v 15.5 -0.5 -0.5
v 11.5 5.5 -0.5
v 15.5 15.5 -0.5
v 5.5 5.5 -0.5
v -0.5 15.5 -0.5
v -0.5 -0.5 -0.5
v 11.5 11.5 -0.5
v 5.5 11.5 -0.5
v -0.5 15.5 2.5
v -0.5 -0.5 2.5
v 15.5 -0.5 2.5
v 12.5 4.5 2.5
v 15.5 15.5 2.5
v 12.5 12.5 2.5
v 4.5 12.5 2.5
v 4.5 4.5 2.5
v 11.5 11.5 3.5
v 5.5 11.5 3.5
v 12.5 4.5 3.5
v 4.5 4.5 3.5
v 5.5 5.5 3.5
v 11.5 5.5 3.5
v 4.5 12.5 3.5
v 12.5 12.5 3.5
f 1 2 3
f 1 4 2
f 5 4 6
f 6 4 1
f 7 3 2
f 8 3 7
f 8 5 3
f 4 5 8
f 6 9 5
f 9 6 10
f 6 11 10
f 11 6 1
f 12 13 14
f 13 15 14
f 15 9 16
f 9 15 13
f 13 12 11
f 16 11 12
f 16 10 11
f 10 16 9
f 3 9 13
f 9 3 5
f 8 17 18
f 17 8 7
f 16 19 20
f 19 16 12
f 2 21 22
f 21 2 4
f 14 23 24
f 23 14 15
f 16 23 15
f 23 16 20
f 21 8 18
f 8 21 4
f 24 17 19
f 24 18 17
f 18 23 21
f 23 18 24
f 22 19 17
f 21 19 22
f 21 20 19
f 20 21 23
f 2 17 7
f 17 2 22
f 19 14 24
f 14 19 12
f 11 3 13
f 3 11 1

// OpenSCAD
union() {
    translate([0, 0, 0]) color("brown") cube([1, 1, 1],center=true);
    translate([0, 0, 1]) color("brown") cube([1, 1, 1],center=true);
    translate([0, 0, 2]) color("brown") cube([1, 1, 1],center=true);
    translate([0, 1, 0]) color("brown") cube([1, 1, 1],center=true);
    translate([0, 1, 1]) color("brown") cube([1, 1, 1],center=true);
    translate([0, 1, 2]) color("brown") cube([1, 1, 1],center=true);
    translate([0, 2, 0]) color("brown") cube([1, 1, 1],center=true);
    translate([0, 2, 1]) color("brown") cube([1, 1, 1],center=true);
    translate([0, 2, 2]) color("brown") cube([1, 1, 1],center=true);
    translate([0, 3, 0]) color("brown") cube([1, 1, 1],center=true);
    translate([0, 3, 1]) color("brown") cube([1, 1, 1],center=true);
    translate([0, 3, 2]) color("brown") cube([1, 1, 1],center=true);
    translate([0, 4, 0]) color("brown") cube([1, 1, 1],center=true);
    translate([0, 4, 1]) color("brown") cube([1, 1, 1],center=true);
    translate([0, 4, 2]) color("brown") cube([1, 1, 1],center=true);
    translate([0, 5, 0]) color("brown") cube([1, 1, 1],center=true);
    translate([0, 5, 1]) color("brown") cube([1, 1, 1],center=true);
    translate([0, 5, 2]) color("brown") cube([1, 1, 1],center=true);
    translate([0, 6, 0]) color("brown") cube([1, 1, 1],center=true);
    translate([0, 6, 1]) color("brown") cube([1, 1, 1],center=true);
    translate([0, 6, 2]) color("brown") cube([1, 1, 1],center=true);
    translate([0, 7, 0]) color("brown") cube([1, 1, 1],center=true);
    translate([0, 7, 1]) color("brown") cube([1, 1, 1],center=true);
    translate([0, 7, 2]) color("brown") cube([1, 1, 1],center=true);
    translate([0, 8, 0]) color("brown") cube([1, 1, 1],center=true);
    translate([0, 8, 1]) color("brown") cube([1, 1, 1],center=true);
    translate([0, 8, 2]) color("brown") cube([1, 1, 1],center=true);
    translate([0, 9, 0]) color("brown") cube([1, 1, 1],center=true);
    translate([0, 9, 1]) color("brown") cube([1, 1, 1],center=true);
    translate([0, 9, 2]) color("brown") cube([1, 1, 1],center=true);
    translate([0, 10, 0]) color("brown") cube([1, 1, 1],center=true);
    translate([0, 10, 1]) color("brown") cube([1, 1, 1],center=true);
    translate([0, 10, 2]) color("brown") cube([1, 1, 1],center=true);
    translate([0, 11, 0]) color("brown") cube([1, 1, 1],center=true);
    translate([0, 11, 1]) color("brown") cube([1, 1, 1],center=true);
    translate([0, 11, 2]) color("brown") cube([1, 1, 1],center=true);
    translate([0, 12, 0]) color("brown") cube([1, 1, 1],center=true);
    translate([0, 12, 1]) color("brown") cube([1, 1, 1],center=true);
    translate([0, 12, 2]) color("brown") cube([1, 1, 1],center=true);
    translate([0, 13, 0]) color("brown") cube([1, 1, 1],center=true);
    translate([0, 13, 1]) color("brown") cube([1, 1, 1],center=true);
    translate([0, 13, 2]) color("brown") cube([1, 1, 1],center=true);
    translate([0, 14, 0]) color("brown") cube([1, 1, 1],center=true);
    translate([0, 14, 1]) color("brown") cube([1, 1, 1],center=true);
    translate([0, 14, 2]) color("brown") cube([1, 1, 1],center=true);
    translate([0, 15, 0]) color("brown") cube([1, 1, 1],center=true);
    translate([0, 15, 1]) color("brown") cube([1, 1, 1],center=true);
    translate([0, 15, 2]) color("brown") cube([1, 1, 1],center=true);
    translate([1, 0, 0]) color("brown") cube([1, 1, 1],center=true);
    translate([1, 0, 1]) color("brown") cube([1, 1, 1],center=true);
    translate([1, 0, 2]) color("brown") cube([1, 1, 1],center=true);
    translate([1, 1, 0]) color("brown") cube([1, 1, 1],center=true);
    translate([1, 1, 1]) color("brown") cube([1, 1, 1],center=true);
    translate([1, 1, 2]) color("brown") cube([1, 1, 1],center=true);
    translate([1, 2, 0]) color("brown") cube([1, 1, 1],center=true);
    translate([1, 2, 1]) color("brown") cube([1, 1, 1],center=true);
    translate([1, 2, 2]) color("brown") cube([1, 1, 1],center=true);
    translate([1, 3, 0]) color("brown") cube([1, 1, 1],center=true);
    translate([1, 3, 1]) color("brown") cube([1, 1, 1],center=true);
    translate([1, 3, 2]) color("brown") cube([1, 1, 1],center=true);
    translate([1, 4, 0]) color("brown") cube([1, 1, 1],center=true);
    translate([1, 4, 1]) color("brown") cube([1, 1, 1],center=true);
    translate([1, 4, 2]) color("brown") cube([1, 1, 1],center=true);
    translate([1, 5, 0]) color("brown") cube([1, 1, 1],center=true);
    translate([1, 5, 1]) color("brown") cube([1, 1, 1],center=true);
    translate([1, 5, 2]) color("brown") cube([1, 1, 1],center=true);
    translate([1, 6, 0]) color("brown") cube([1, 1, 1],center=true);
    translate([1, 6, 1]) color("brown") cube([1, 1, 1],center=true);
    translate([1, 6, 2]) color("brown") cube([1, 1, 1],center=true);
    translate([1, 7, 0]) color("brown") cube([1, 1, 1],center=true);
    translate([1, 7, 1]) color("brown") cube([1, 1, 1],center=true);
    translate([1, 7, 2]) color("brown") cube([1, 1, 1],center=true);
    translate([1, 8, 0]) color("brown") cube([1, 1, 1],center=true);
    translate([1, 8, 1]) color("brown") cube([1, 1, 1],center=true);
    translate([1, 8, 2]) color("brown") cube([1, 1, 1],center=true);
    translate([1, 9, 0]) color("brown") cube([1, 1, 1],center=true);
    translate([1, 9, 1]) color("brown") cube([1, 1, 1],center=true);
    translate([1, 9, 2]) color("brown") cube([1, 1, 1],center=true);
    translate([1, 10, 0]) color("brown") cube([1, 1, 1],center=true);
    translate([1, 10, 1]) color("brown") cube([1, 1, 1],center=true);
    translate([1, 10, 2]) color("brown") cube([1, 1, 1],center=true);
    translate([1, 11, 0]) color("brown") cube([1, 1, 1],center=true);
    translate([1, 11, 1]) color("brown") cube([1, 1, 1],center=true);
    translate([1, 11, 2]) color("brown") cube([1, 1, 1],center=true);
    translate([1, 12, 0]) color("brown") cube([1, 1, 1],center=true);
    translate([1, 12, 1]) color("brown") cube([1, 1, 1],center=true);
    translate([1, 12, 2]) color("brown") cube([1, 1, 1],center=true);
    translate([1, 13, 0]) color("brown") cube([1, 1, 1],center=true);
    translate([1, 13, 1]) color("brown") cube([1, 1, 1],center=true);
    translate([1, 13, 2]) color("brown") cube([1, 1, 1],center=true);
    translate([1, 14, 0]) color("brown") cube([1, 1, 1],center=true);
    translate([1, 14, 1]) color("brown") cube([1, 1, 1],center=true);
    translate([1, 14, 2]) color("brown") cube([1, 1, 1],center=true);
    translate([1, 15, 0]) color("brown") cube([1, 1, 1],center=true);
    translate([1, 15, 1]) color("brown") cube([1, 1, 1],center=true);
    translate([1, 15, 2]) color("brown") cube([1, 1, 1],center=true);
    translate([2, 0, 0]) color("brown") cube([1, 1, 1],center=true);
    translate([2, 0, 1]) color("brown") cube([1, 1, 1],center=true);
    translate([2, 0, 2]) color("brown") cube([1, 1, 1],center=true);
    translate([2, 1, 0]) color("brown") cube([1, 1, 1],center=true);
    translate([2, 1, 1]) color("brown") cube([1, 1, 1],center=true);
    translate([2, 1, 2]) color("brown") cube([1, 1, 1],center=true);
    translate([2, 2, 0]) color("brown") cube([1, 1, 1],center=true);
    translate([2, 2, 1]) color("brown") cube([1, 1, 1],center=true);
    translate([2, 2, 2]) color("brown") cube([1, 1, 1],center=true);
    translate([2, 3, 0]) color("brown") cube([1, 1, 1],center=true);
    translate([2, 3, 1]) color("brown") cube([1, 1, 1],center=true);
    translate([2, 3, 2]) color("brown") cube([1, 1, 1],center=true);
    translate([2, 4, 0]) color("brown") cube([1, 1, 1],center=true);
    translate([2, 4, 1]) color("brown") cube([1, 1, 1],center=true);
    translate([2, 4, 2]) color("brown") cube([1, 1, 1],center=true);
    translate([2, 5, 0]) color("brown") cube([1, 1, 1],center=true);
    translate([2, 5, 1]) color("brown") cube([1, 1, 1],center=true);
    translate([2, 5, 2]) color("brown") cube([1, 1, 1],center=true);
    translate([2, 6, 0]) color("brown") cube([1, 1, 1],center=true);
    translate([2, 6, 1]) color("brown") cube([1, 1, 1],center=true);
    translate([2, 6, 2]) color("brown") cube([1, 1, 1],center=true);
    translate([2, 7, 0]) color("brown") cube([1, 1, 1],center=true);
    translate([2, 7, 1]) color("brown") cube([1, 1, 1],center=true);
    translate([2, 7, 2]) color("brown") cube([1, 1, 1],center=true);
    translate([2, 8, 0]) color("brown") cube([1, 1, 1],center=true);
    translate([2, 8, 1]) color("brown") cube([1, 1, 1],center=true);
    translate([2, 8, 2]) color("brown") cube([1, 1, 1],center=true);
    translate([2, 9, 0]) color("brown") cube([1, 1, 1],center=true);
    translate([2, 9, 1]) color("brown") cube([1, 1, 1],center=true);
    translate([2, 9, 2]) color("brown") cube([1, 1, 1],center=true);
    translate([2, 10, 0]) color("brown") cube([1, 1, 1],center=true);
    translate([2, 10, 1]) color("brown") cube([1, 1, 1],center=true);
    translate([2, 10, 2]) color("brown") cube([1, 1, 1],center=true);
    translate([2, 11, 0]) color("brown") cube([1, 1, 1],center=true);
    translate([2, 11, 1]) color("brown") cube([1, 1, 1],center=true);
    translate([2, 11, 2]) color("brown") cube([1, 1, 1],center=true);
    translate([2, 12, 0]) color("brown") cube([1, 1, 1],center=true);
    translate([2, 12, 1]) color("brown") cube([1, 1, 1],center=true);
    translate([2, 12, 2]) color("brown") cube([1, 1, 1],center=true);
    translate([2, 13, 0]) color("brown") cube([1, 1, 1],center=true);
    translate([2, 13, 1]) color("brown") cube([1, 1, 1],center=true);
    translate([2, 13, 2]) color("brown") cube([1, 1, 1],center=true);
    translate([2, 14, 0]) color("brown") cube([1, 1, 1],center=true);
    translate([2, 14, 1]) color("brown") cube([1, 1, 1],center=true);
    translate([2, 14, 2]) color("brown") cube([1, 1, 1],center=true);
    translate([2, 15, 0]) color("brown") cube([1, 1, 1],center=true);
    translate([2, 15, 1]) color("brown") cube([1, 1, 1],center=true);
    translate([2, 15, 2]) color("brown") cube([1, 1, 1],center=true);
    translate([3, 0, 0]) color("brown") cube([1, 1, 1],center=true);
    translate([3, 0, 1]) color("brown") cube([1, 1, 1],center=true);
    translate([3, 0, 2]) color("brown") cube([1, 1, 1],center=true);
    translate([3, 1, 0]) color("brown") cube([1, 1, 1],center=true);
    translate([3, 1, 1]) color("brown") cube([1, 1, 1],center=true);
    translate([3, 1, 2]) color("brown") cube([1, 1, 1],center=true);
    translate([3, 2, 0]) color("brown") cube([1, 1, 1],center=true);
    translate([3, 2, 1]) color("brown") cube([1, 1, 1],center=true);
    translate([3, 2, 2]) color("brown") cube([1, 1, 1],center=true);
    translate([3, 3, 0]) color("brown") cube([1, 1, 1],center=true);
    translate([3, 3, 1]) color("brown") cube([1, 1, 1],center=true);
    translate([3, 3, 2]) color("brown") cube([1, 1, 1],center=true);
    translate([3, 4, 0]) color("brown") cube([1, 1, 1],center=true);
    translate([3, 4, 1]) color("brown") cube([1, 1, 1],center=true);
    translate([3, 4, 2]) color("brown") cube([1, 1, 1],center=true);
    translate([3, 5, 0]) color("brown") cube([1, 1, 1],center=true);
    translate([3, 5, 1]) color("brown") cube([1, 1, 1],center=true);
    translate([3, 5, 2]) color("brown") cube([1, 1, 1],center=true);
    translate([3, 6, 0]) color("brown") cube([1, 1, 1],center=true);
    translate([3, 6, 1]) color("brown") cube([1, 1, 1],center=true);
    translate([3, 6, 2]) color("brown") cube([1, 1, 1],center=true);
    translate([3, 7, 0]) color("brown") cube([1, 1, 1],center=true);
    translate([3, 7, 1]) color("brown") cube([1, 1, 1],center=true);
    translate([3, 7, 2]) color("brown") cube([1, 1, 1],center=true);
    translate([3, 8, 0]) color("brown") cube([1, 1, 1],center=true);
    translate([3, 8, 1]) color("brown") cube([1, 1, 1],center=true);
    translate([3, 8, 2]) color("brown") cube([1, 1, 1],center=true);
    translate([3, 9, 0]) color("brown") cube([1, 1, 1],center=true);
    translate([3, 9, 1]) color("brown") cube([1, 1, 1],center=true);
    translate([3, 9, 2]) color("brown") cube([1, 1, 1],center=true);
    translate([3, 10, 0]) color("brown") cube([1, 1, 1],center=true);
    translate([3, 10, 1]) color("brown") cube([1, 1, 1],center=true);
    translate([3, 10, 2]) color("brown") cube([1, 1, 1],center=true);
    translate([3, 11, 0]) color("brown") cube([1, 1, 1],center=true);
    translate([3, 11, 1]) color("brown") cube([1, 1, 1],center=true);
    translate([3, 11, 2]) color("brown") cube([1, 1, 1],center=true);
    translate([3, 12, 0]) color("brown") cube([1, 1, 1],center=true);
    translate([3, 12, 1]) color("brown") cube([1, 1, 1],center=true);
    translate([3, 12, 2]) color("brown") cube([1, 1, 1],center=true);
    translate([3, 13, 0]) color("brown") cube([1, 1, 1],center=true);
    translate([3, 13, 1]) color("brown") cube([1, 1, 1],center=true);
    translate([3, 13, 2]) color("brown") cube([1, 1, 1],center=true);
    translate([3, 14, 0]) color("brown") cube([1, 1, 1],center=true);
    translate([3, 14, 1]) color("brown") cube([1, 1, 1],center=true);
    translate([3, 14, 2]) color("brown") cube([1, 1, 1],center=true);
    translate([3, 15, 0]) color("brown") cube([1, 1, 1],center=true);
    translate([3, 15, 1]) color("brown") cube([1, 1, 1],center=true);
    translate([3, 15, 2]) color("brown") cube([1, 1, 1],center=true);
    translate([4, 0, 0]) color("brown") cube([1, 1, 1],center=true);
    translate([4, 0, 1]) color("brown") cube([1, 1, 1],center=true);
    translate([4, 0, 2]) color("brown") cube([1, 1, 1],center=true);
    translate([4, 1, 0]) color("brown") cube([1, 1, 1],center=true);
    translate([4, 1, 1]) color("brown") cube([1, 1, 1],center=true);
    translate([4, 1, 2]) color("brown") cube([1, 1, 1],center=true);
    translate([4, 2, 0]) color("brown") cube([1, 1, 1],center=true);
    translate([4, 2, 1]) color("brown") cube([1, 1, 1],center=true);
    translate([4, 2, 2]) color("brown") cube([1, 1, 1],center=true);
    translate([4, 3, 0]) color("brown") cube([1, 1, 1],center=true);
    translate([4, 3, 1]) color("brown") cube([1, 1, 1],center=true);
    translate([4, 3, 2]) color("brown") cube([1, 1, 1],center=true);
    translate([4, 4, 0]) color("brown") cube([1, 1, 1],center=true);
    translate([4, 4, 1]) color("brown") cube([1, 1, 1],center=true);
    translate([4, 4, 2]) color("brown") cube([1, 1, 1],center=true);
    translate([4, 5, 0]) color("brown") cube([1, 1, 1],center=true);
    translate([4, 5, 1]) color("brown") cube([1, 1, 1],center=true);
    translate([4, 5, 2]) color("brown") cube([1, 1, 1],center=true);
    translate([4, 6, 0]) color("brown") cube([1, 1, 1],center=true);
    translate([4, 6, 1]) color("brown") cube([1, 1, 1],center=true);
    translate([4, 6, 2]) color("brown") cube([1, 1, 1],center=true);
    translate([4, 7, 0]) color("brown") cube([1, 1, 1],center=true);
    translate([4, 7, 1]) color("brown") cube([1, 1, 1],center=true);
    translate([4, 7, 2]) color("brown") cube([1, 1, 1],center=true);
    translate([4, 8, 0]) color("brown") cube([1, 1, 1],center=true);
    translate([4, 8, 1]) color("brown") cube([1, 1, 1],center=true);
    translate([4, 8, 2]) color("brown") cube([1, 1, 1],center=true);
    translate([4, 9, 0]) color("brown") cube([1, 1, 1],center=true);
    translate([4, 9, 1]) color("brown") cube([1, 1, 1],center=true);
    translate([4, 9, 2]) color("brown") cube([1, 1, 1],center=true);
    translate([4, 10, 0]) color("brown") cube([1, 1, 1],center=true);
    translate([4, 10, 1]) color("brown") cube([1, 1, 1],center=true);
    translate([4, 10, 2]) color("brown") cube([1, 1, 1],center=true);
    translate([4, 11, 0]) color("brown") cube([1, 1, 1],center=true);
    translate([4, 11, 1]) color("brown") cube([1, 1, 1],center=true);
    translate([4, 11, 2]) color("brown") cube([1, 1, 1],center=true);
    translate([4, 12, 0]) color("brown") cube([1, 1, 1],center=true);
    translate([4, 12, 1]) color("brown") cube([1, 1, 1],center=true);
    translate([4, 12, 2]) color("brown") cube([1, 1, 1],center=true);
    translate([4, 13, 0]) color("brown") cube([1, 1, 1],center=true);
    translate([4, 13, 1]) color("brown") cube([1, 1, 1],center=true);
    translate([4, 13, 2]) color("brown") cube([1, 1, 1],center=true);
    translate([4, 14, 0]) color("brown") cube([1, 1, 1],center=true);
    translate([4, 14, 1]) color("brown") cube([1, 1, 1],center=true);
    translate([4, 14, 2]) color("brown") cube([1, 1, 1],center=true);
    translate([4, 15, 0]) color("brown") cube([1, 1, 1],center=true);
    translate([4, 15, 1]) color("brown") cube([1, 1, 1],center=true);
    translate([4, 15, 2]) color("brown") cube([1, 1, 1],center=true);
    translate([5, 0, 0]) color("brown") cube([1, 1, 1],center=true);
    translate([5, 0, 1]) color("brown") cube([1, 1, 1],center=true);
    translate([5, 0, 2]) color("brown") cube([1, 1, 1],center=true);
    translate([5, 1, 0]) color("brown") cube([1, 1, 1],center=true);
    translate([5, 1, 1]) color("brown") cube([1, 1, 1],center=true);
    translate([5, 1, 2]) color("brown") cube([1, 1, 1],center=true);
    translate([5, 2, 0]) color("brown") cube([1, 1, 1],center=true);
    translate([5, 2, 1]) color("brown") cube([1, 1, 1],center=true);
    translate([5, 2, 2]) color("brown") cube([1, 1, 1],center=true);
    translate([5, 3, 0]) color("brown") cube([1, 1, 1],center=true);
    translate([5, 3, 1]) color("brown") cube([1, 1, 1],center=true);
    translate([5, 3, 2]) color("brown") cube([1, 1, 1],center=true);
    translate([5, 4, 0]) color("brown") cube([1, 1, 1],center=true);
    translate([5, 4, 1]) color("brown") cube([1, 1, 1],center=true);
    translate([5, 4, 2]) color("brown") cube([1, 1, 1],center=true);
    translate([5, 5, 0]) color("brown") cube([1, 1, 1],center=true);
    translate([5, 5, 1]) color("brown") cube([1, 1, 1],center=true);
    translate([5, 5, 2]) color("brown") cube([1, 1, 1],center=true);
    translate([5, 5, 3]) color("brown") cube([1, 1, 1],center=true);
    translate([5, 6, 0]) color("brown") cube([1, 1, 1],center=true);
    translate([5, 6, 1]) color("brown") cube([1, 1, 1],center=true);
    translate([5, 6, 2]) color("brown") cube([1, 1, 1],center=true);
    translate([5, 6, 3]) color("brown") cube([1, 1, 1],center=true);
    translate([5, 7, 0]) color("brown") cube([1, 1, 1],center=true);
    translate([5, 7, 1]) color("brown") cube([1, 1, 1],center=true);
    translate([5, 7, 2]) color("brown") cube([1, 1, 1],center=true);
    translate([5, 7, 3]) color("brown") cube([1, 1, 1],center=true);
    translate([5, 8, 0]) color("brown") cube([1, 1, 1],center=true);
    translate([5, 8, 1]) color("brown") cube([1, 1, 1],center=true);
    translate([5, 8, 2]) color("brown") cube([1, 1, 1],center=true);
    translate([5, 8, 3]) color("brown") cube([1, 1, 1],center=true);
    translate([5, 9, 0]) color("brown") cube([1, 1, 1],center=true);
    translate([5, 9, 1]) color("brown") cube([1, 1, 1],center=true);
    translate([5, 9, 2]) color("brown") cube([1, 1, 1],center=true);
    translate([5, 9, 3]) color("brown") cube([1, 1, 1],center=true);
    translate([5, 10, 0]) color("brown") cube([1, 1, 1],center=true);
    translate([5, 10, 1]) color("brown") cube([1, 1, 1],center=true);
    translate([5, 10, 2]) color("brown") cube([1, 1, 1],center=true);
    translate([5, 10, 3]) color("brown") cube([1, 1, 1],center=true);
    translate([5, 11, 0]) color("brown") cube([1, 1, 1],center=true);
    translate([5, 11, 1]) color("brown") cube([1, 1, 1],center=true);
    translate([5, 11, 2]) color("brown") cube([1, 1, 1],center=true);
    translate([5, 11, 3]) color("brown") cube([1, 1, 1],center=true);
    translate([5, 12, 0]) color("brown") cube([1, 1, 1],center=true);
    translate([5, 12, 1]) color("brown") cube([1, 1, 1],center=true);
    translate([5, 12, 2]) color("brown") cube([1, 1, 1],center=true);
    translate([5, 12, 3]) color("brown") cube([1, 1, 1],center=true);
    translate([5, 13, 0]) color("brown") cube([1, 1, 1],center=true);
    translate([5, 13, 1]) color("brown") cube([1, 1, 1],center=true);
    translate([5, 13, 2]) color("brown") cube([1, 1, 1],center=true);
    translate([5, 14, 0]) color("brown") cube([1, 1, 1],center=true);
    translate([5, 14, 1]) color("brown") cube([1, 1, 1],center=true);
    translate([5, 14, 2]) color("brown") cube([1, 1, 1],center=true);
    translate([5, 15, 0]) color("brown") cube([1, 1, 1],center=true);
    translate([5, 15, 1]) color("brown") cube([1, 1, 1],center=true);
    translate([5, 15, 2]) color("brown") cube([1, 1, 1],center=true);
    translate([6, 0, 0]) color("brown") cube([1, 1, 1],center=true);
    translate([6, 0, 1]) color("brown") cube([1, 1, 1],center=true);
    translate([6, 0, 2]) color("brown") cube([1, 1, 1],center=true);
    translate([6, 1, 0]) color("brown") cube([1, 1, 1],center=true);
    translate([6, 1, 1]) color("brown") cube([1, 1, 1],center=true);
    translate([6, 1, 2]) color("brown") cube([1, 1, 1],center=true);
    translate([6, 2, 0]) color("brown") cube([1, 1, 1],center=true);
    translate([6, 2, 1]) color("brown") cube([1, 1, 1],center=true);
    translate([6, 2, 2]) color("brown") cube([1, 1, 1],center=true);
    translate([6, 3, 0]) color("brown") cube([1, 1, 1],center=true);
    translate([6, 3, 1]) color("brown") cube([1, 1, 1],center=true);
    translate([6, 3, 2]) color("brown") cube([1, 1, 1],center=true);
    translate([6, 4, 0]) color("brown") cube([1, 1, 1],center=true);
    translate([6, 4, 1]) color("brown") cube([1, 1, 1],center=true);
    translate([6, 4, 2]) color("brown") cube([1, 1, 1],center=true);
    translate([6, 5, 0]) color("brown") cube([1, 1, 1],center=true);
    translate([6, 5, 1]) color("brown") cube([1, 1, 1],center=true);
    translate([6, 5, 2]) color("brown") cube([1, 1, 1],center=true);
    translate([6, 5, 3]) color("brown") cube([1, 1, 1],center=true);
    translate([6, 12, 0]) color("brown") cube([1, 1, 1],center=true);
    translate([6, 12, 1]) color("brown") cube([1, 1, 1],center=true);
    translate([6, 12, 2]) color("brown") cube([1, 1, 1],center=true);
    translate([6, 12, 3]) color("brown") cube([1, 1, 1],center=true);
    translate([6, 13, 0]) color("brown") cube([1, 1, 1],center=true);
    translate([6, 13, 1]) color("brown") cube([1, 1, 1],center=true);
    translate([6, 13, 2]) color("brown") cube([1, 1, 1],center=true);
    translate([6, 14, 0]) color("brown") cube([1, 1, 1],center=true);
    translate([6, 14, 1]) color("brown") cube([1, 1, 1],center=true);
    translate([6, 14, 2]) color("brown") cube([1, 1, 1],center=true);
    translate([6, 15, 0]) color("brown") cube([1, 1, 1],center=true);
    translate([6, 15, 1]) color("brown") cube([1, 1, 1],center=true);
    translate([6, 15, 2]) color("brown") cube([1, 1, 1],center=true);
    translate([7, 0, 0]) color("brown") cube([1, 1, 1],center=true);
    translate([7, 0, 1]) color("brown") cube([1, 1, 1],center=true);
    translate([7, 0, 2]) color("brown") cube([1, 1, 1],center=true);
    translate([7, 1, 0]) color("brown") cube([1, 1, 1],center=true);
    translate([7, 1, 1]) color("brown") cube([1, 1, 1],center=true);
    translate([7, 1, 2]) color("brown") cube([1, 1, 1],center=true);
    translate([7, 2, 0]) color("brown") cube([1, 1, 1],center=true);
    translate([7, 2, 1]) color("brown") cube([1, 1, 1],center=true);
    translate([7, 2, 2]) color("brown") cube([1, 1, 1],center=true);
    translate([7, 3, 0]) color("brown") cube([1, 1, 1],center=true);
    translate([7, 3, 1]) color("brown") cube([1, 1, 1],center=true);
    translate([7, 3, 2]) color("brown") cube([1, 1, 1],center=true);
    translate([7, 4, 0]) color("brown") cube([1, 1, 1],center=true);
    translate([7, 4, 1]) color("brown") cube([1, 1, 1],center=true);
    translate([7, 4, 2]) color("brown") cube([1, 1, 1],center=true);
    translate([7, 5, 0]) color("brown") cube([1, 1, 1],center=true);
    translate([7, 5, 1]) color("brown") cube([1, 1, 1],center=true);
    translate([7, 5, 2]) color("brown") cube([1, 1, 1],center=true);
    translate([7, 5, 3]) color("brown") cube([1, 1, 1],center=true);
    translate([7, 12, 0]) color("brown") cube([1, 1, 1],center=true);
    translate([7, 12, 1]) color("brown") cube([1, 1, 1],center=true);
    translate([7, 12, 2]) color("brown") cube([1, 1, 1],center=true);
    translate([7, 12, 3]) color("brown") cube([1, 1, 1],center=true);
    translate([7, 13, 0]) color("brown") cube([1, 1, 1],center=true);
    translate([7, 13, 1]) color("brown") cube([1, 1, 1],center=true);
    translate([7, 13, 2]) color("brown") cube([1, 1, 1],center=true);
    translate([7, 14, 0]) color("brown") cube([1, 1, 1],center=true);
    translate([7, 14, 1]) color("brown") cube([1, 1, 1],center=true);
    translate([7, 14, 2]) color("brown") cube([1, 1, 1],center=true);
    translate([7, 15, 0]) color("brown") cube([1, 1, 1],center=true);
    translate([7, 15, 1]) color("brown") cube([1, 1, 1],center=true);
    translate([7, 15, 2]) color("brown") cube([1, 1, 1],center=true);
    translate([8, 0, 0]) color("brown") cube([1, 1, 1],center=true);
    translate([8, 0, 1]) color("brown") cube([1, 1, 1],center=true);
    translate([8, 0, 2]) color("brown") cube([1, 1, 1],center=true);
    translate([8, 1, 0]) color("brown") cube([1, 1, 1],center=true);
    translate([8, 1, 1]) color("brown") cube([1, 1, 1],center=true);
    translate([8, 1, 2]) color("brown") cube([1, 1, 1],center=true);
    translate([8, 2, 0]) color("brown") cube([1, 1, 1],center=true);
    translate([8, 2, 1]) color("brown") cube([1, 1, 1],center=true);
    translate([8, 2, 2]) color("brown") cube([1, 1, 1],center=true);
    translate([8, 3, 0]) color("brown") cube([1, 1, 1],center=true);
    translate([8, 3, 1]) color("brown") cube([1, 1, 1],center=true);
    translate([8, 3, 2]) color("brown") cube([1, 1, 1],center=true);
    translate([8, 4, 0]) color("brown") cube([1, 1, 1],center=true);
    translate([8, 4, 1]) color("brown") cube([1, 1, 1],center=true);
    translate([8, 4, 2]) color("brown") cube([1, 1, 1],center=true);
    translate([8, 5, 0]) color("brown") cube([1, 1, 1],center=true);
    translate([8, 5, 1]) color("brown") cube([1, 1, 1],center=true);
    translate([8, 5, 2]) color("brown") cube([1, 1, 1],center=true);
    translate([8, 5, 3]) color("brown") cube([1, 1, 1],center=true);
    translate([8, 12, 0]) color("brown") cube([1, 1, 1],center=true);
    translate([8, 12, 1]) color("brown") cube([1, 1, 1],center=true);
    translate([8, 12, 2]) color("brown") cube([1, 1, 1],center=true);
    translate([8, 12, 3]) color("brown") cube([1, 1, 1],center=true);
    translate([8, 13, 0]) color("brown") cube([1, 1, 1],center=true);
    translate([8, 13, 1]) color("brown") cube([1, 1, 1],center=true);
    translate([8, 13, 2]) color("brown") cube([1, 1, 1],center=true);
    translate([8, 14, 0]) color("brown") cube([1, 1, 1],center=true);
    translate([8, 14, 1]) color("brown") cube([1, 1, 1],center=true);
    translate([8, 14, 2]) color("brown") cube([1, 1, 1],center=true);
    translate([8, 15, 0]) color("brown") cube([1, 1, 1],center=true);
    translate([8, 15, 1]) color("brown") cube([1, 1, 1],center=true);
    translate([8, 15, 2]) color("brown") cube([1, 1, 1],center=true);
    translate([9, 0, 0]) color("brown") cube([1, 1, 1],center=true);
    translate([9, 0, 1]) color("brown") cube([1, 1, 1],center=true);
    translate([9, 0, 2]) color("brown") cube([1, 1, 1],center=true);
    translate([9, 1, 0]) color("brown") cube([1, 1, 1],center=true);
    translate([9, 1, 1]) color("brown") cube([1, 1, 1],center=true);
    translate([9, 1, 2]) color("brown") cube([1, 1, 1],center=true);
    translate([9, 2, 0]) color("brown") cube([1, 1, 1],center=true);
    translate([9, 2, 1]) color("brown") cube([1, 1, 1],center=true);
    translate([9, 2, 2]) color("brown") cube([1, 1, 1],center=true);
    translate([9, 3, 0]) color("brown") cube([1, 1, 1],center=true);
    translate([9, 3, 1]) color("brown") cube([1, 1, 1],center=true);
    translate([9, 3, 2]) color("brown") cube([1, 1, 1],center=true);
    translate([9, 4, 0]) color("brown") cube([1, 1, 1],center=true);
    translate([9, 4, 1]) color("brown") cube([1, 1, 1],center=true);
    translate([9, 4, 2]) color("brown") cube([1, 1, 1],center=true);
    translate([9, 5, 0]) color("brown") cube([1, 1, 1],center=true);
    translate([9, 5, 1]) color("brown") cube([1, 1, 1],center=true);
    translate([9, 5, 2]) color("brown") cube([1, 1, 1],center=true);
    translate([9, 5, 3]) color("brown") cube([1, 1, 1],center=true);
    translate([9, 12, 0]) color("brown") cube([1, 1, 1],center=true);
    translate([9, 12, 1]) color("brown") cube([1, 1, 1],center=true);
    translate([9, 12, 2]) color("brown") cube([1, 1, 1],center=true);
    translate([9, 12, 3]) color("brown") cube([1, 1, 1],center=true);
    translate([9, 13, 0]) color("brown") cube([1, 1, 1],center=true);
    translate([9, 13, 1]) color("brown") cube([1, 1, 1],center=true);
    translate([9, 13, 2]) color("brown") cube([1, 1, 1],center=true);
    translate([9, 14, 0]) color("brown") cube([1, 1, 1],center=true);
    translate([9, 14, 1]) color("brown") cube([1, 1, 1],center=true);
    translate([9, 14, 2]) color("brown") cube([1, 1, 1],center=true);
    translate([9, 15, 0]) color("brown") cube([1, 1, 1],center=true);
    translate([9, 15, 1]) color("brown") cube([1, 1, 1],center=true);
    translate([9, 15, 2]) color("brown") cube([1, 1, 1],center=true);
    translate([10, 0, 0]) color("brown") cube([1, 1, 1],center=true);
    translate([10, 0, 1]) color("brown") cube([1, 1, 1],center=true);
    translate([10, 0, 2]) color("brown") cube([1, 1, 1],center=true);
    translate([10, 1, 0]) color("brown") cube([1, 1, 1],center=true);
    translate([10, 1, 1]) color("brown") cube([1, 1, 1],center=true);
    translate([10, 1, 2]) color("brown") cube([1, 1, 1],center=true);
    translate([10, 2, 0]) color("brown") cube([1, 1, 1],center=true);
    translate([10, 2, 1]) color("brown") cube([1, 1, 1],center=true);
    translate([10, 2, 2]) color("brown") cube([1, 1, 1],center=true);
    translate([10, 3, 0]) color("brown") cube([1, 1, 1],center=true);
    translate([10, 3, 1]) color("brown") cube([1, 1, 1],center=true);
    translate([10, 3, 2]) color("brown") cube([1, 1, 1],center=true);
    translate([10, 4, 0]) color("brown") cube([1, 1, 1],center=true);
    translate([10, 4, 1]) color("brown") cube([1, 1, 1],center=true);
    translate([10, 4, 2]) color("brown") cube([1, 1, 1],center=true);
    translate([10, 5, 0]) color("brown") cube([1, 1, 1],center=true);
    translate([10, 5, 1]) color("brown") cube([1, 1, 1],center=true);
    translate([10, 5, 2]) color("brown") cube([1, 1, 1],center=true);
    translate([10, 5, 3]) color("brown") cube([1, 1, 1],center=true);
    translate([10, 12, 0]) color("brown") cube([1, 1, 1],center=true);
    translate([10, 12, 1]) color("brown") cube([1, 1, 1],center=true);
    translate([10, 12, 2]) color("brown") cube([1, 1, 1],center=true);
    translate([10, 12, 3]) color("brown") cube([1, 1, 1],center=true);
    translate([10, 13, 0]) color("brown") cube([1, 1, 1],center=true);
    translate([10, 13, 1]) color("brown") cube([1, 1, 1],center=true);
    translate([10, 13, 2]) color("brown") cube([1, 1, 1],center=true);
    translate([10, 14, 0]) color("brown") cube([1, 1, 1],center=true);
    translate([10, 14, 1]) color("brown") cube([1, 1, 1],center=true);
    translate([10, 14, 2]) color("brown") cube([1, 1, 1],center=true);
    translate([10, 15, 0]) color("brown") cube([1, 1, 1],center=true);
    translate([10, 15, 1]) color("brown") cube([1, 1, 1],center=true);
    translate([10, 15, 2]) color("brown") cube([1, 1, 1],center=true);
    translate([11, 0, 0]) color("brown") cube([1, 1, 1],center=true);
    translate([11, 0, 1]) color("brown") cube([1, 1, 1],center=true);
    translate([11, 0, 2]) color("brown") cube([1, 1, 1],center=true);
    translate([11, 1, 0]) color("brown") cube([1, 1, 1],center=true);
    translate([11, 1, 1]) color("brown") cube([1, 1, 1],center=true);
    translate([11, 1, 2]) color("brown") cube([1, 1, 1],center=true);
    translate([11, 2, 0]) color("brown") cube([1, 1, 1],center=true);
    translate([11, 2, 1]) color("brown") cube([1, 1, 1],center=true);
    translate([11, 2, 2]) color("brown") cube([1, 1, 1],center=true);
    translate([11, 3, 0]) color("brown") cube([1, 1, 1],center=true);
    translate([11, 3, 1]) color("brown") cube([1, 1, 1],center=true);
    translate([11, 3, 2]) color("brown") cube([1, 1, 1],center=true);
    translate([11, 4, 0]) color("brown") cube([1, 1, 1],center=true);
    translate([11, 4, 1]) color("brown") cube([1, 1, 1],center=true);
    translate([11, 4, 2]) color("brown") cube([1, 1, 1],center=true);
    translate([11, 5, 0]) color("brown") cube([1, 1, 1],center=true);
    translate([11, 5, 1]) color("brown") cube([1, 1, 1],center=true);
    translate([11, 5, 2]) color("brown") cube([1, 1, 1],center=true);
    translate([11, 5, 3]) color("brown") cube([1, 1, 1],center=true);
    translate([11, 12, 0]) color("brown") cube([1, 1, 1],center=true);
    translate([11, 12, 1]) color("brown") cube([1, 1, 1],center=true);
    translate([11, 12, 2]) color("brown") cube([1, 1, 1],center=true);
    translate([11, 12, 3]) color("brown") cube([1, 1, 1],center=true);
    translate([11, 13, 0]) color("brown") cube([1, 1, 1],center=true);
    translate([11, 13, 1]) color("brown") cube([1, 1, 1],center=true);
    translate([11, 13, 2]) color("brown") cube([1, 1, 1],center=true);
    translate([11, 14, 0]) color("brown") cube([1, 1, 1],center=true);
    translate([11, 14, 1]) color("brown") cube([1, 1, 1],center=true);
    translate([11, 14, 2]) color("brown") cube([1, 1, 1],center=true);
    translate([11, 15, 0]) color("brown") cube([1, 1, 1],center=true);
    translate([11, 15, 1]) color("brown") cube([1, 1, 1],center=true);
    translate([11, 15, 2]) color("brown") cube([1, 1, 1],center=true);
    translate([12, 0, 0]) color("brown") cube([1, 1, 1],center=true);
    translate([12, 0, 1]) color("brown") cube([1, 1, 1],center=true);
    translate([12, 0, 2]) color("brown") cube([1, 1, 1],center=true);
    translate([12, 1, 0]) color("brown") cube([1, 1, 1],center=true);
    translate([12, 1, 1]) color("brown") cube([1, 1, 1],center=true);
    translate([12, 1, 2]) color("brown") cube([1, 1, 1],center=true);
    translate([12, 2, 0]) color("brown") cube([1, 1, 1],center=true);
    translate([12, 2, 1]) color("brown") cube([1, 1, 1],center=true);
    translate([12, 2, 2]) color("brown") cube([1, 1, 1],center=true);
    translate([12, 3, 0]) color("brown") cube([1, 1, 1],center=true);
    translate([12, 3, 1]) color("brown") cube([1, 1, 1],center=true);
    translate([12, 3, 2]) color("brown") cube([1, 1, 1],center=true);
    translate([12, 4, 0]) color("brown") cube([1, 1, 1],center=true);
    translate([12, 4, 1]) color("brown") cube([1, 1, 1],center=true);
    translate([12, 4, 2]) color("brown") cube([1, 1, 1],center=true);
    translate([12, 5, 0]) color("brown") cube([1, 1, 1],center=true);
    translate([12, 5, 1]) color("brown") cube([1, 1, 1],center=true);
    translate([12, 5, 2]) color("brown") cube([1, 1, 1],center=true);
    translate([12, 5, 3]) color("brown") cube([1, 1, 1],center=true);
    translate([12, 6, 0]) color("brown") cube([1, 1, 1],center=true);
    translate([12, 6, 1]) color("brown") cube([1, 1, 1],center=true);
    translate([12, 6, 2]) color("brown") cube([1, 1, 1],center=true);
    translate([12, 6, 3]) color("brown") cube([1, 1, 1],center=true);
    translate([12, 7, 0]) color("brown") cube([1, 1, 1],center=true);
    translate([12, 7, 1]) color("brown") cube([1, 1, 1],center=true);
    translate([12, 7, 2]) color("brown") cube([1, 1, 1],center=true);
    translate([12, 7, 3]) color("brown") cube([1, 1, 1],center=true);
    translate([12, 8, 0]) color("brown") cube([1, 1, 1],center=true);
    translate([12, 8, 1]) color("brown") cube([1, 1, 1],center=true);
    translate([12, 8, 2]) color("brown") cube([1, 1, 1],center=true);
    translate([12, 8, 3]) color("brown") cube([1, 1, 1],center=true);
    translate([12, 9, 0]) color("brown") cube([1, 1, 1],center=true);
    translate([12, 9, 1]) color("brown") cube([1, 1, 1],center=true);
    translate([12, 9, 2]) color("brown") cube([1, 1, 1],center=true);
    translate([12, 9, 3]) color("brown") cube([1, 1, 1],center=true);
    translate([12, 10, 0]) color("brown") cube([1, 1, 1],center=true);
    translate([12, 10, 1]) color("brown") cube([1, 1, 1],center=true);
    translate([12, 10, 2]) color("brown") cube([1, 1, 1],center=true);
    translate([12, 10, 3]) color("brown") cube([1, 1, 1],center=true);
    translate([12, 11, 0]) color("brown") cube([1, 1, 1],center=true);
    translate([12, 11, 1]) color("brown") cube([1, 1, 1],center=true);
    translate([12, 11, 2]) color("brown") cube([1, 1, 1],center=true);
    translate([12, 11, 3]) color("brown") cube([1, 1, 1],center=true);
    translate([12, 12, 0]) color("brown") cube([1, 1, 1],center=true);
    translate([12, 12, 1]) color("brown") cube([1, 1, 1],center=true);
    translate([12, 12, 2]) color("brown") cube([1, 1, 1],center=true);
    translate([12, 12, 3]) color("brown") cube([1, 1, 1],center=true);
    translate([12, 13, 0]) color("brown") cube([1, 1, 1],center=true);
    translate([12, 13, 1]) color("brown") cube([1, 1, 1],center=true);
    translate([12, 13, 2]) color("brown") cube([1, 1, 1],center=true);
    translate([12, 14, 0]) color("brown") cube([1, 1, 1],center=true);
    translate([12, 14, 1]) color("brown") cube([1, 1, 1],center=true);
    translate([12, 14, 2]) color("brown") cube([1, 1, 1],center=true);
    translate([12, 15, 0]) color("brown") cube([1, 1, 1],center=true);
    translate([12, 15, 1]) color("brown") cube([1, 1, 1],center=true);
    translate([12, 15, 2]) color("brown") cube([1, 1, 1],center=true);
    translate([13, 0, 0]) color("brown") cube([1, 1, 1],center=true);
    translate([13, 0, 1]) color("brown") cube([1, 1, 1],center=true);
    translate([13, 0, 2]) color("brown") cube([1, 1, 1],center=true);
    translate([13, 1, 0]) color("brown") cube([1, 1, 1],center=true);
    translate([13, 1, 1]) color("brown") cube([1, 1, 1],center=true);
    translate([13, 1, 2]) color("brown") cube([1, 1, 1],center=true);
    translate([13, 2, 0]) color("brown") cube([1, 1, 1],center=true);
    translate([13, 2, 1]) color("brown") cube([1, 1, 1],center=true);
    translate([13, 2, 2]) color("brown") cube([1, 1, 1],center=true);
    translate([13, 3, 0]) color("brown") cube([1, 1, 1],center=true);
    translate([13, 3, 1]) color("brown") cube([1, 1, 1],center=true);
    translate([13, 3, 2]) color("brown") cube([1, 1, 1],center=true);
    translate([13, 4, 0]) color("brown") cube([1, 1, 1],center=true);
    translate([13, 4, 1]) color("brown") cube([1, 1, 1],center=true);
    translate([13, 4, 2]) color("brown") cube([1, 1, 1],center=true);
    translate([13, 5, 0]) color("brown") cube([1, 1, 1],center=true);
    translate([13, 5, 1]) color("brown") cube([1, 1, 1],center=true);
    translate([13, 5, 2]) color("brown") cube([1, 1, 1],center=true);
    translate([13, 6, 0]) color("brown") cube([1, 1, 1],center=true);
    translate([13, 6, 1]) color("brown") cube([1, 1, 1],center=true);
    translate([13, 6, 2]) color("brown") cube([1, 1, 1],center=true);
    translate([13, 7, 0]) color("brown") cube([1, 1, 1],center=true);
    translate([13, 7, 1]) color("brown") cube([1, 1, 1],center=true);
    translate([13, 7, 2]) color("brown") cube([1, 1, 1],center=true);
    translate([13, 8, 0]) color("brown") cube([1, 1, 1],center=true);
    translate([13, 8, 1]) color("brown") cube([1, 1, 1],center=true);
    translate([13, 8, 2]) color("brown") cube([1, 1, 1],center=true);
    translate([13, 9, 0]) color("brown") cube([1, 1, 1],center=true);
    translate([13, 9, 1]) color("brown") cube([1, 1, 1],center=true);
    translate([13, 9, 2]) color("brown") cube([1, 1, 1],center=true);
    translate([13, 10, 0]) color("brown") cube([1, 1, 1],center=true);
    translate([13, 10, 1]) color("brown") cube([1, 1, 1],center=true);
    translate([13, 10, 2]) color("brown") cube([1, 1, 1],center=true);
    translate([13, 11, 0]) color("brown") cube([1, 1, 1],center=true);
    translate([13, 11, 1]) color("brown") cube([1, 1, 1],center=true);
    translate([13, 11, 2]) color("brown") cube([1, 1, 1],center=true);
    translate([13, 12, 0]) color("brown") cube([1, 1, 1],center=true);
    translate([13, 12, 1]) color("brown") cube([1, 1, 1],center=true);
    translate([13, 12, 2]) color("brown") cube([1, 1, 1],center=true);
    translate([13, 13, 0]) color("brown") cube([1, 1, 1],center=true);
    translate([13, 13, 1]) color("brown") cube([1, 1, 1],center=true);
    translate([13, 13, 2]) color("brown") cube([1, 1, 1],center=true);
    translate([13, 14, 0]) color("brown") cube([1, 1, 1],center=true);
    translate([13, 14, 1]) color("brown") cube([1, 1, 1],center=true);
    translate([13, 14, 2]) color("brown") cube([1, 1, 1],center=true);
    translate([13, 15, 0]) color("brown") cube([1, 1, 1],center=true);
    translate([13, 15, 1]) color("brown") cube([1, 1, 1],center=true);
    translate([13, 15, 2]) color("brown") cube([1, 1, 1],center=true);
    translate([14, 0, 0]) color("brown") cube([1, 1, 1],center=true);
    translate([14, 0, 1]) color("brown") cube([1, 1, 1],center=true);
    translate([14, 0, 2]) color("brown") cube([1, 1, 1],center=true);
    translate([14, 1, 0]) color("brown") cube([1, 1, 1],center=true);
    translate([14, 1, 1]) color("brown") cube([1, 1, 1],center=true);
    translate([14, 1, 2]) color("brown") cube([1, 1, 1],center=true);
    translate([14, 2, 0]) color("brown") cube([1, 1, 1],center=true);
    translate([14, 2, 1]) color("brown") cube([1, 1, 1],center=true);
    translate([14, 2, 2]) color("brown") cube([1, 1, 1],center=true);
    translate([14, 3, 0]) color("brown") cube([1, 1, 1],center=true);
    translate([14, 3, 1]) color("brown") cube([1, 1, 1],center=true);
    translate([14, 3, 2]) color("brown") cube([1, 1, 1],center=true);
    translate([14, 4, 0]) color("brown") cube([1, 1, 1],center=true);
    translate([14, 4, 1]) color("brown") cube([1, 1, 1],center=true);
    translate([14, 4, 2]) color("brown") cube([1, 1, 1],center=true);
    translate([14, 5, 0]) color("brown") cube([1, 1, 1],center=true);
    translate([14, 5, 1]) color("brown") cube([1, 1, 1],center=true);
    translate([14, 5, 2]) color("brown") cube([1, 1, 1],center=true);
    translate([14, 6, 0]) color("brown") cube([1, 1, 1],center=true);
    translate([14, 6, 1]) color("brown") cube([1, 1, 1],center=true);
    translate([14, 6, 2]) color("brown") cube([1, 1, 1],center=true);
    translate([14, 7, 0]) color("brown") cube([1, 1, 1],center=true);
    translate([14, 7, 1]) color("brown") cube([1, 1, 1],center=true);
    translate([14, 7, 2]) color("brown") cube([1, 1, 1],center=true);
    translate([14, 8, 0]) color("brown") cube([1, 1, 1],center=true);
    translate([14, 8, 1]) color("brown") cube([1, 1, 1],center=true);
    translate([14, 8, 2]) color("brown") cube([1, 1, 1],center=true);
    translate([14, 9, 0]) color("brown") cube([1, 1, 1],center=true);
    translate([14, 9, 1]) color("brown") cube([1, 1, 1],center=true);
    translate([14, 9, 2]) color("brown") cube([1, 1, 1],center=true);
    translate([14, 10, 0]) color("brown") cube([1, 1, 1],center=true);
    translate([14, 10, 1]) color("brown") cube([1, 1, 1],center=true);
    translate([14, 10, 2]) color("brown") cube([1, 1, 1],center=true);
    translate([14, 11, 0]) color("brown") cube([1, 1, 1],center=true);
    translate([14, 11, 1]) color("brown") cube([1, 1, 1],center=true);
    translate([14, 11, 2]) color("brown") cube([1, 1, 1],center=true);
    translate([14, 12, 0]) color("brown") cube([1, 1, 1],center=true);
    translate([14, 12, 1]) color("brown") cube([1, 1, 1],center=true);
    translate([14, 12, 2]) color("brown") cube([1, 1, 1],center=true);
    translate([14, 13, 0]) color("brown") cube([1, 1, 1],center=true);
    translate([14, 13, 1]) color("brown") cube([1, 1, 1],center=true);
    translate([14, 13, 2]) color("brown") cube([1, 1, 1],center=true);
    translate([14, 14, 0]) color("brown") cube([1, 1, 1],center=true);
    translate([14, 14, 1]) color("brown") cube([1, 1, 1],center=true);
    translate([14, 14, 2]) color("brown") cube([1, 1, 1],center=true);
    translate([14, 15, 0]) color("brown") cube([1, 1, 1],center=true);
    translate([14, 15, 1]) color("brown") cube([1, 1, 1],center=true);
    translate([14, 15, 2]) color("brown") cube([1, 1, 1],center=true);
    translate([15, 0, 0]) color("brown") cube([1, 1, 1],center=true);
    translate([15, 0, 1]) color("brown") cube([1, 1, 1],center=true);
    translate([15, 0, 2]) color("brown") cube([1, 1, 1],center=true);
    translate([15, 1, 0]) color("brown") cube([1, 1, 1],center=true);
    translate([15, 1, 1]) color("brown") cube([1, 1, 1],center=true);
    translate([15, 1, 2]) color("brown") cube([1, 1, 1],center=true);
    translate([15, 2, 0]) color("brown") cube([1, 1, 1],center=true);
    translate([15, 2, 1]) color("brown") cube([1, 1, 1],center=true);
    translate([15, 2, 2]) color("brown") cube([1, 1, 1],center=true);
    translate([15, 3, 0]) color("brown") cube([1, 1, 1],center=true);
    translate([15, 3, 1]) color("brown") cube([1, 1, 1],center=true);
    translate([15, 3, 2]) color("brown") cube([1, 1, 1],center=true);
    translate([15, 4, 0]) color("brown") cube([1, 1, 1],center=true);
    translate([15, 4, 1]) color("brown") cube([1, 1, 1],center=true);
    translate([15, 4, 2]) color("brown") cube([1, 1, 1],center=true);
    translate([15, 5, 0]) color("brown") cube([1, 1, 1],center=true);
    translate([15, 5, 1]) color("brown") cube([1, 1, 1],center=true);
    translate([15, 5, 2]) color("brown") cube([1, 1, 1],center=true);
    translate([15, 6, 0]) color("brown") cube([1, 1, 1],center=true);
    translate([15, 6, 1]) color("brown") cube([1, 1, 1],center=true);
    translate([15, 6, 2]) color("brown") cube([1, 1, 1],center=true);
    translate([15, 7, 0]) color("brown") cube([1, 1, 1],center=true);
    translate([15, 7, 1]) color("brown") cube([1, 1, 1],center=true);
    translate([15, 7, 2]) color("brown") cube([1, 1, 1],center=true);
    translate([15, 8, 0]) color("brown") cube([1, 1, 1],center=true);
    translate([15, 8, 1]) color("brown") cube([1, 1, 1],center=true);
    translate([15, 8, 2]) color("brown") cube([1, 1, 1],center=true);
    translate([15, 9, 0]) color("brown") cube([1, 1, 1],center=true);
    translate([15, 9, 1]) color("brown") cube([1, 1, 1],center=true);
    translate([15, 9, 2]) color("brown") cube([1, 1, 1],center=true);
    translate([15, 10, 0]) color("brown") cube([1, 1, 1],center=true);
    translate([15, 10, 1]) color("brown") cube([1, 1, 1],center=true);
    translate([15, 10, 2]) color("brown") cube([1, 1, 1],center=true);
    translate([15, 11, 0]) color("brown") cube([1, 1, 1],center=true);
    translate([15, 11, 1]) color("brown") cube([1, 1, 1],center=true);
    translate([15, 11, 2]) color("brown") cube([1, 1, 1],center=true);
    translate([15, 12, 0]) color("brown") cube([1, 1, 1],center=true);
    translate([15, 12, 1]) color("brown") cube([1, 1, 1],center=true);
    translate([15, 12, 2]) color("brown") cube([1, 1, 1],center=true);
    translate([15, 13, 0]) color("brown") cube([1, 1, 1],center=true);
    translate([15, 13, 1]) color("brown") cube([1, 1, 1],center=true);
    translate([15, 13, 2]) color("brown") cube([1, 1, 1],center=true);
    translate([15, 14, 0]) color("brown") cube([1, 1, 1],center=true);
    translate([15, 14, 1]) color("brown") cube([1, 1, 1],center=true);
    translate([15, 14, 2]) color("brown") cube([1, 1, 1],center=true);
    translate([15, 15, 0]) color("brown") cube([1, 1, 1],center=true);
    translate([15, 15, 1]) color("brown") cube([1, 1, 1],center=true);
    translate([15, 15, 2]) color("brown") cube([1, 1, 1],center=true);
}
